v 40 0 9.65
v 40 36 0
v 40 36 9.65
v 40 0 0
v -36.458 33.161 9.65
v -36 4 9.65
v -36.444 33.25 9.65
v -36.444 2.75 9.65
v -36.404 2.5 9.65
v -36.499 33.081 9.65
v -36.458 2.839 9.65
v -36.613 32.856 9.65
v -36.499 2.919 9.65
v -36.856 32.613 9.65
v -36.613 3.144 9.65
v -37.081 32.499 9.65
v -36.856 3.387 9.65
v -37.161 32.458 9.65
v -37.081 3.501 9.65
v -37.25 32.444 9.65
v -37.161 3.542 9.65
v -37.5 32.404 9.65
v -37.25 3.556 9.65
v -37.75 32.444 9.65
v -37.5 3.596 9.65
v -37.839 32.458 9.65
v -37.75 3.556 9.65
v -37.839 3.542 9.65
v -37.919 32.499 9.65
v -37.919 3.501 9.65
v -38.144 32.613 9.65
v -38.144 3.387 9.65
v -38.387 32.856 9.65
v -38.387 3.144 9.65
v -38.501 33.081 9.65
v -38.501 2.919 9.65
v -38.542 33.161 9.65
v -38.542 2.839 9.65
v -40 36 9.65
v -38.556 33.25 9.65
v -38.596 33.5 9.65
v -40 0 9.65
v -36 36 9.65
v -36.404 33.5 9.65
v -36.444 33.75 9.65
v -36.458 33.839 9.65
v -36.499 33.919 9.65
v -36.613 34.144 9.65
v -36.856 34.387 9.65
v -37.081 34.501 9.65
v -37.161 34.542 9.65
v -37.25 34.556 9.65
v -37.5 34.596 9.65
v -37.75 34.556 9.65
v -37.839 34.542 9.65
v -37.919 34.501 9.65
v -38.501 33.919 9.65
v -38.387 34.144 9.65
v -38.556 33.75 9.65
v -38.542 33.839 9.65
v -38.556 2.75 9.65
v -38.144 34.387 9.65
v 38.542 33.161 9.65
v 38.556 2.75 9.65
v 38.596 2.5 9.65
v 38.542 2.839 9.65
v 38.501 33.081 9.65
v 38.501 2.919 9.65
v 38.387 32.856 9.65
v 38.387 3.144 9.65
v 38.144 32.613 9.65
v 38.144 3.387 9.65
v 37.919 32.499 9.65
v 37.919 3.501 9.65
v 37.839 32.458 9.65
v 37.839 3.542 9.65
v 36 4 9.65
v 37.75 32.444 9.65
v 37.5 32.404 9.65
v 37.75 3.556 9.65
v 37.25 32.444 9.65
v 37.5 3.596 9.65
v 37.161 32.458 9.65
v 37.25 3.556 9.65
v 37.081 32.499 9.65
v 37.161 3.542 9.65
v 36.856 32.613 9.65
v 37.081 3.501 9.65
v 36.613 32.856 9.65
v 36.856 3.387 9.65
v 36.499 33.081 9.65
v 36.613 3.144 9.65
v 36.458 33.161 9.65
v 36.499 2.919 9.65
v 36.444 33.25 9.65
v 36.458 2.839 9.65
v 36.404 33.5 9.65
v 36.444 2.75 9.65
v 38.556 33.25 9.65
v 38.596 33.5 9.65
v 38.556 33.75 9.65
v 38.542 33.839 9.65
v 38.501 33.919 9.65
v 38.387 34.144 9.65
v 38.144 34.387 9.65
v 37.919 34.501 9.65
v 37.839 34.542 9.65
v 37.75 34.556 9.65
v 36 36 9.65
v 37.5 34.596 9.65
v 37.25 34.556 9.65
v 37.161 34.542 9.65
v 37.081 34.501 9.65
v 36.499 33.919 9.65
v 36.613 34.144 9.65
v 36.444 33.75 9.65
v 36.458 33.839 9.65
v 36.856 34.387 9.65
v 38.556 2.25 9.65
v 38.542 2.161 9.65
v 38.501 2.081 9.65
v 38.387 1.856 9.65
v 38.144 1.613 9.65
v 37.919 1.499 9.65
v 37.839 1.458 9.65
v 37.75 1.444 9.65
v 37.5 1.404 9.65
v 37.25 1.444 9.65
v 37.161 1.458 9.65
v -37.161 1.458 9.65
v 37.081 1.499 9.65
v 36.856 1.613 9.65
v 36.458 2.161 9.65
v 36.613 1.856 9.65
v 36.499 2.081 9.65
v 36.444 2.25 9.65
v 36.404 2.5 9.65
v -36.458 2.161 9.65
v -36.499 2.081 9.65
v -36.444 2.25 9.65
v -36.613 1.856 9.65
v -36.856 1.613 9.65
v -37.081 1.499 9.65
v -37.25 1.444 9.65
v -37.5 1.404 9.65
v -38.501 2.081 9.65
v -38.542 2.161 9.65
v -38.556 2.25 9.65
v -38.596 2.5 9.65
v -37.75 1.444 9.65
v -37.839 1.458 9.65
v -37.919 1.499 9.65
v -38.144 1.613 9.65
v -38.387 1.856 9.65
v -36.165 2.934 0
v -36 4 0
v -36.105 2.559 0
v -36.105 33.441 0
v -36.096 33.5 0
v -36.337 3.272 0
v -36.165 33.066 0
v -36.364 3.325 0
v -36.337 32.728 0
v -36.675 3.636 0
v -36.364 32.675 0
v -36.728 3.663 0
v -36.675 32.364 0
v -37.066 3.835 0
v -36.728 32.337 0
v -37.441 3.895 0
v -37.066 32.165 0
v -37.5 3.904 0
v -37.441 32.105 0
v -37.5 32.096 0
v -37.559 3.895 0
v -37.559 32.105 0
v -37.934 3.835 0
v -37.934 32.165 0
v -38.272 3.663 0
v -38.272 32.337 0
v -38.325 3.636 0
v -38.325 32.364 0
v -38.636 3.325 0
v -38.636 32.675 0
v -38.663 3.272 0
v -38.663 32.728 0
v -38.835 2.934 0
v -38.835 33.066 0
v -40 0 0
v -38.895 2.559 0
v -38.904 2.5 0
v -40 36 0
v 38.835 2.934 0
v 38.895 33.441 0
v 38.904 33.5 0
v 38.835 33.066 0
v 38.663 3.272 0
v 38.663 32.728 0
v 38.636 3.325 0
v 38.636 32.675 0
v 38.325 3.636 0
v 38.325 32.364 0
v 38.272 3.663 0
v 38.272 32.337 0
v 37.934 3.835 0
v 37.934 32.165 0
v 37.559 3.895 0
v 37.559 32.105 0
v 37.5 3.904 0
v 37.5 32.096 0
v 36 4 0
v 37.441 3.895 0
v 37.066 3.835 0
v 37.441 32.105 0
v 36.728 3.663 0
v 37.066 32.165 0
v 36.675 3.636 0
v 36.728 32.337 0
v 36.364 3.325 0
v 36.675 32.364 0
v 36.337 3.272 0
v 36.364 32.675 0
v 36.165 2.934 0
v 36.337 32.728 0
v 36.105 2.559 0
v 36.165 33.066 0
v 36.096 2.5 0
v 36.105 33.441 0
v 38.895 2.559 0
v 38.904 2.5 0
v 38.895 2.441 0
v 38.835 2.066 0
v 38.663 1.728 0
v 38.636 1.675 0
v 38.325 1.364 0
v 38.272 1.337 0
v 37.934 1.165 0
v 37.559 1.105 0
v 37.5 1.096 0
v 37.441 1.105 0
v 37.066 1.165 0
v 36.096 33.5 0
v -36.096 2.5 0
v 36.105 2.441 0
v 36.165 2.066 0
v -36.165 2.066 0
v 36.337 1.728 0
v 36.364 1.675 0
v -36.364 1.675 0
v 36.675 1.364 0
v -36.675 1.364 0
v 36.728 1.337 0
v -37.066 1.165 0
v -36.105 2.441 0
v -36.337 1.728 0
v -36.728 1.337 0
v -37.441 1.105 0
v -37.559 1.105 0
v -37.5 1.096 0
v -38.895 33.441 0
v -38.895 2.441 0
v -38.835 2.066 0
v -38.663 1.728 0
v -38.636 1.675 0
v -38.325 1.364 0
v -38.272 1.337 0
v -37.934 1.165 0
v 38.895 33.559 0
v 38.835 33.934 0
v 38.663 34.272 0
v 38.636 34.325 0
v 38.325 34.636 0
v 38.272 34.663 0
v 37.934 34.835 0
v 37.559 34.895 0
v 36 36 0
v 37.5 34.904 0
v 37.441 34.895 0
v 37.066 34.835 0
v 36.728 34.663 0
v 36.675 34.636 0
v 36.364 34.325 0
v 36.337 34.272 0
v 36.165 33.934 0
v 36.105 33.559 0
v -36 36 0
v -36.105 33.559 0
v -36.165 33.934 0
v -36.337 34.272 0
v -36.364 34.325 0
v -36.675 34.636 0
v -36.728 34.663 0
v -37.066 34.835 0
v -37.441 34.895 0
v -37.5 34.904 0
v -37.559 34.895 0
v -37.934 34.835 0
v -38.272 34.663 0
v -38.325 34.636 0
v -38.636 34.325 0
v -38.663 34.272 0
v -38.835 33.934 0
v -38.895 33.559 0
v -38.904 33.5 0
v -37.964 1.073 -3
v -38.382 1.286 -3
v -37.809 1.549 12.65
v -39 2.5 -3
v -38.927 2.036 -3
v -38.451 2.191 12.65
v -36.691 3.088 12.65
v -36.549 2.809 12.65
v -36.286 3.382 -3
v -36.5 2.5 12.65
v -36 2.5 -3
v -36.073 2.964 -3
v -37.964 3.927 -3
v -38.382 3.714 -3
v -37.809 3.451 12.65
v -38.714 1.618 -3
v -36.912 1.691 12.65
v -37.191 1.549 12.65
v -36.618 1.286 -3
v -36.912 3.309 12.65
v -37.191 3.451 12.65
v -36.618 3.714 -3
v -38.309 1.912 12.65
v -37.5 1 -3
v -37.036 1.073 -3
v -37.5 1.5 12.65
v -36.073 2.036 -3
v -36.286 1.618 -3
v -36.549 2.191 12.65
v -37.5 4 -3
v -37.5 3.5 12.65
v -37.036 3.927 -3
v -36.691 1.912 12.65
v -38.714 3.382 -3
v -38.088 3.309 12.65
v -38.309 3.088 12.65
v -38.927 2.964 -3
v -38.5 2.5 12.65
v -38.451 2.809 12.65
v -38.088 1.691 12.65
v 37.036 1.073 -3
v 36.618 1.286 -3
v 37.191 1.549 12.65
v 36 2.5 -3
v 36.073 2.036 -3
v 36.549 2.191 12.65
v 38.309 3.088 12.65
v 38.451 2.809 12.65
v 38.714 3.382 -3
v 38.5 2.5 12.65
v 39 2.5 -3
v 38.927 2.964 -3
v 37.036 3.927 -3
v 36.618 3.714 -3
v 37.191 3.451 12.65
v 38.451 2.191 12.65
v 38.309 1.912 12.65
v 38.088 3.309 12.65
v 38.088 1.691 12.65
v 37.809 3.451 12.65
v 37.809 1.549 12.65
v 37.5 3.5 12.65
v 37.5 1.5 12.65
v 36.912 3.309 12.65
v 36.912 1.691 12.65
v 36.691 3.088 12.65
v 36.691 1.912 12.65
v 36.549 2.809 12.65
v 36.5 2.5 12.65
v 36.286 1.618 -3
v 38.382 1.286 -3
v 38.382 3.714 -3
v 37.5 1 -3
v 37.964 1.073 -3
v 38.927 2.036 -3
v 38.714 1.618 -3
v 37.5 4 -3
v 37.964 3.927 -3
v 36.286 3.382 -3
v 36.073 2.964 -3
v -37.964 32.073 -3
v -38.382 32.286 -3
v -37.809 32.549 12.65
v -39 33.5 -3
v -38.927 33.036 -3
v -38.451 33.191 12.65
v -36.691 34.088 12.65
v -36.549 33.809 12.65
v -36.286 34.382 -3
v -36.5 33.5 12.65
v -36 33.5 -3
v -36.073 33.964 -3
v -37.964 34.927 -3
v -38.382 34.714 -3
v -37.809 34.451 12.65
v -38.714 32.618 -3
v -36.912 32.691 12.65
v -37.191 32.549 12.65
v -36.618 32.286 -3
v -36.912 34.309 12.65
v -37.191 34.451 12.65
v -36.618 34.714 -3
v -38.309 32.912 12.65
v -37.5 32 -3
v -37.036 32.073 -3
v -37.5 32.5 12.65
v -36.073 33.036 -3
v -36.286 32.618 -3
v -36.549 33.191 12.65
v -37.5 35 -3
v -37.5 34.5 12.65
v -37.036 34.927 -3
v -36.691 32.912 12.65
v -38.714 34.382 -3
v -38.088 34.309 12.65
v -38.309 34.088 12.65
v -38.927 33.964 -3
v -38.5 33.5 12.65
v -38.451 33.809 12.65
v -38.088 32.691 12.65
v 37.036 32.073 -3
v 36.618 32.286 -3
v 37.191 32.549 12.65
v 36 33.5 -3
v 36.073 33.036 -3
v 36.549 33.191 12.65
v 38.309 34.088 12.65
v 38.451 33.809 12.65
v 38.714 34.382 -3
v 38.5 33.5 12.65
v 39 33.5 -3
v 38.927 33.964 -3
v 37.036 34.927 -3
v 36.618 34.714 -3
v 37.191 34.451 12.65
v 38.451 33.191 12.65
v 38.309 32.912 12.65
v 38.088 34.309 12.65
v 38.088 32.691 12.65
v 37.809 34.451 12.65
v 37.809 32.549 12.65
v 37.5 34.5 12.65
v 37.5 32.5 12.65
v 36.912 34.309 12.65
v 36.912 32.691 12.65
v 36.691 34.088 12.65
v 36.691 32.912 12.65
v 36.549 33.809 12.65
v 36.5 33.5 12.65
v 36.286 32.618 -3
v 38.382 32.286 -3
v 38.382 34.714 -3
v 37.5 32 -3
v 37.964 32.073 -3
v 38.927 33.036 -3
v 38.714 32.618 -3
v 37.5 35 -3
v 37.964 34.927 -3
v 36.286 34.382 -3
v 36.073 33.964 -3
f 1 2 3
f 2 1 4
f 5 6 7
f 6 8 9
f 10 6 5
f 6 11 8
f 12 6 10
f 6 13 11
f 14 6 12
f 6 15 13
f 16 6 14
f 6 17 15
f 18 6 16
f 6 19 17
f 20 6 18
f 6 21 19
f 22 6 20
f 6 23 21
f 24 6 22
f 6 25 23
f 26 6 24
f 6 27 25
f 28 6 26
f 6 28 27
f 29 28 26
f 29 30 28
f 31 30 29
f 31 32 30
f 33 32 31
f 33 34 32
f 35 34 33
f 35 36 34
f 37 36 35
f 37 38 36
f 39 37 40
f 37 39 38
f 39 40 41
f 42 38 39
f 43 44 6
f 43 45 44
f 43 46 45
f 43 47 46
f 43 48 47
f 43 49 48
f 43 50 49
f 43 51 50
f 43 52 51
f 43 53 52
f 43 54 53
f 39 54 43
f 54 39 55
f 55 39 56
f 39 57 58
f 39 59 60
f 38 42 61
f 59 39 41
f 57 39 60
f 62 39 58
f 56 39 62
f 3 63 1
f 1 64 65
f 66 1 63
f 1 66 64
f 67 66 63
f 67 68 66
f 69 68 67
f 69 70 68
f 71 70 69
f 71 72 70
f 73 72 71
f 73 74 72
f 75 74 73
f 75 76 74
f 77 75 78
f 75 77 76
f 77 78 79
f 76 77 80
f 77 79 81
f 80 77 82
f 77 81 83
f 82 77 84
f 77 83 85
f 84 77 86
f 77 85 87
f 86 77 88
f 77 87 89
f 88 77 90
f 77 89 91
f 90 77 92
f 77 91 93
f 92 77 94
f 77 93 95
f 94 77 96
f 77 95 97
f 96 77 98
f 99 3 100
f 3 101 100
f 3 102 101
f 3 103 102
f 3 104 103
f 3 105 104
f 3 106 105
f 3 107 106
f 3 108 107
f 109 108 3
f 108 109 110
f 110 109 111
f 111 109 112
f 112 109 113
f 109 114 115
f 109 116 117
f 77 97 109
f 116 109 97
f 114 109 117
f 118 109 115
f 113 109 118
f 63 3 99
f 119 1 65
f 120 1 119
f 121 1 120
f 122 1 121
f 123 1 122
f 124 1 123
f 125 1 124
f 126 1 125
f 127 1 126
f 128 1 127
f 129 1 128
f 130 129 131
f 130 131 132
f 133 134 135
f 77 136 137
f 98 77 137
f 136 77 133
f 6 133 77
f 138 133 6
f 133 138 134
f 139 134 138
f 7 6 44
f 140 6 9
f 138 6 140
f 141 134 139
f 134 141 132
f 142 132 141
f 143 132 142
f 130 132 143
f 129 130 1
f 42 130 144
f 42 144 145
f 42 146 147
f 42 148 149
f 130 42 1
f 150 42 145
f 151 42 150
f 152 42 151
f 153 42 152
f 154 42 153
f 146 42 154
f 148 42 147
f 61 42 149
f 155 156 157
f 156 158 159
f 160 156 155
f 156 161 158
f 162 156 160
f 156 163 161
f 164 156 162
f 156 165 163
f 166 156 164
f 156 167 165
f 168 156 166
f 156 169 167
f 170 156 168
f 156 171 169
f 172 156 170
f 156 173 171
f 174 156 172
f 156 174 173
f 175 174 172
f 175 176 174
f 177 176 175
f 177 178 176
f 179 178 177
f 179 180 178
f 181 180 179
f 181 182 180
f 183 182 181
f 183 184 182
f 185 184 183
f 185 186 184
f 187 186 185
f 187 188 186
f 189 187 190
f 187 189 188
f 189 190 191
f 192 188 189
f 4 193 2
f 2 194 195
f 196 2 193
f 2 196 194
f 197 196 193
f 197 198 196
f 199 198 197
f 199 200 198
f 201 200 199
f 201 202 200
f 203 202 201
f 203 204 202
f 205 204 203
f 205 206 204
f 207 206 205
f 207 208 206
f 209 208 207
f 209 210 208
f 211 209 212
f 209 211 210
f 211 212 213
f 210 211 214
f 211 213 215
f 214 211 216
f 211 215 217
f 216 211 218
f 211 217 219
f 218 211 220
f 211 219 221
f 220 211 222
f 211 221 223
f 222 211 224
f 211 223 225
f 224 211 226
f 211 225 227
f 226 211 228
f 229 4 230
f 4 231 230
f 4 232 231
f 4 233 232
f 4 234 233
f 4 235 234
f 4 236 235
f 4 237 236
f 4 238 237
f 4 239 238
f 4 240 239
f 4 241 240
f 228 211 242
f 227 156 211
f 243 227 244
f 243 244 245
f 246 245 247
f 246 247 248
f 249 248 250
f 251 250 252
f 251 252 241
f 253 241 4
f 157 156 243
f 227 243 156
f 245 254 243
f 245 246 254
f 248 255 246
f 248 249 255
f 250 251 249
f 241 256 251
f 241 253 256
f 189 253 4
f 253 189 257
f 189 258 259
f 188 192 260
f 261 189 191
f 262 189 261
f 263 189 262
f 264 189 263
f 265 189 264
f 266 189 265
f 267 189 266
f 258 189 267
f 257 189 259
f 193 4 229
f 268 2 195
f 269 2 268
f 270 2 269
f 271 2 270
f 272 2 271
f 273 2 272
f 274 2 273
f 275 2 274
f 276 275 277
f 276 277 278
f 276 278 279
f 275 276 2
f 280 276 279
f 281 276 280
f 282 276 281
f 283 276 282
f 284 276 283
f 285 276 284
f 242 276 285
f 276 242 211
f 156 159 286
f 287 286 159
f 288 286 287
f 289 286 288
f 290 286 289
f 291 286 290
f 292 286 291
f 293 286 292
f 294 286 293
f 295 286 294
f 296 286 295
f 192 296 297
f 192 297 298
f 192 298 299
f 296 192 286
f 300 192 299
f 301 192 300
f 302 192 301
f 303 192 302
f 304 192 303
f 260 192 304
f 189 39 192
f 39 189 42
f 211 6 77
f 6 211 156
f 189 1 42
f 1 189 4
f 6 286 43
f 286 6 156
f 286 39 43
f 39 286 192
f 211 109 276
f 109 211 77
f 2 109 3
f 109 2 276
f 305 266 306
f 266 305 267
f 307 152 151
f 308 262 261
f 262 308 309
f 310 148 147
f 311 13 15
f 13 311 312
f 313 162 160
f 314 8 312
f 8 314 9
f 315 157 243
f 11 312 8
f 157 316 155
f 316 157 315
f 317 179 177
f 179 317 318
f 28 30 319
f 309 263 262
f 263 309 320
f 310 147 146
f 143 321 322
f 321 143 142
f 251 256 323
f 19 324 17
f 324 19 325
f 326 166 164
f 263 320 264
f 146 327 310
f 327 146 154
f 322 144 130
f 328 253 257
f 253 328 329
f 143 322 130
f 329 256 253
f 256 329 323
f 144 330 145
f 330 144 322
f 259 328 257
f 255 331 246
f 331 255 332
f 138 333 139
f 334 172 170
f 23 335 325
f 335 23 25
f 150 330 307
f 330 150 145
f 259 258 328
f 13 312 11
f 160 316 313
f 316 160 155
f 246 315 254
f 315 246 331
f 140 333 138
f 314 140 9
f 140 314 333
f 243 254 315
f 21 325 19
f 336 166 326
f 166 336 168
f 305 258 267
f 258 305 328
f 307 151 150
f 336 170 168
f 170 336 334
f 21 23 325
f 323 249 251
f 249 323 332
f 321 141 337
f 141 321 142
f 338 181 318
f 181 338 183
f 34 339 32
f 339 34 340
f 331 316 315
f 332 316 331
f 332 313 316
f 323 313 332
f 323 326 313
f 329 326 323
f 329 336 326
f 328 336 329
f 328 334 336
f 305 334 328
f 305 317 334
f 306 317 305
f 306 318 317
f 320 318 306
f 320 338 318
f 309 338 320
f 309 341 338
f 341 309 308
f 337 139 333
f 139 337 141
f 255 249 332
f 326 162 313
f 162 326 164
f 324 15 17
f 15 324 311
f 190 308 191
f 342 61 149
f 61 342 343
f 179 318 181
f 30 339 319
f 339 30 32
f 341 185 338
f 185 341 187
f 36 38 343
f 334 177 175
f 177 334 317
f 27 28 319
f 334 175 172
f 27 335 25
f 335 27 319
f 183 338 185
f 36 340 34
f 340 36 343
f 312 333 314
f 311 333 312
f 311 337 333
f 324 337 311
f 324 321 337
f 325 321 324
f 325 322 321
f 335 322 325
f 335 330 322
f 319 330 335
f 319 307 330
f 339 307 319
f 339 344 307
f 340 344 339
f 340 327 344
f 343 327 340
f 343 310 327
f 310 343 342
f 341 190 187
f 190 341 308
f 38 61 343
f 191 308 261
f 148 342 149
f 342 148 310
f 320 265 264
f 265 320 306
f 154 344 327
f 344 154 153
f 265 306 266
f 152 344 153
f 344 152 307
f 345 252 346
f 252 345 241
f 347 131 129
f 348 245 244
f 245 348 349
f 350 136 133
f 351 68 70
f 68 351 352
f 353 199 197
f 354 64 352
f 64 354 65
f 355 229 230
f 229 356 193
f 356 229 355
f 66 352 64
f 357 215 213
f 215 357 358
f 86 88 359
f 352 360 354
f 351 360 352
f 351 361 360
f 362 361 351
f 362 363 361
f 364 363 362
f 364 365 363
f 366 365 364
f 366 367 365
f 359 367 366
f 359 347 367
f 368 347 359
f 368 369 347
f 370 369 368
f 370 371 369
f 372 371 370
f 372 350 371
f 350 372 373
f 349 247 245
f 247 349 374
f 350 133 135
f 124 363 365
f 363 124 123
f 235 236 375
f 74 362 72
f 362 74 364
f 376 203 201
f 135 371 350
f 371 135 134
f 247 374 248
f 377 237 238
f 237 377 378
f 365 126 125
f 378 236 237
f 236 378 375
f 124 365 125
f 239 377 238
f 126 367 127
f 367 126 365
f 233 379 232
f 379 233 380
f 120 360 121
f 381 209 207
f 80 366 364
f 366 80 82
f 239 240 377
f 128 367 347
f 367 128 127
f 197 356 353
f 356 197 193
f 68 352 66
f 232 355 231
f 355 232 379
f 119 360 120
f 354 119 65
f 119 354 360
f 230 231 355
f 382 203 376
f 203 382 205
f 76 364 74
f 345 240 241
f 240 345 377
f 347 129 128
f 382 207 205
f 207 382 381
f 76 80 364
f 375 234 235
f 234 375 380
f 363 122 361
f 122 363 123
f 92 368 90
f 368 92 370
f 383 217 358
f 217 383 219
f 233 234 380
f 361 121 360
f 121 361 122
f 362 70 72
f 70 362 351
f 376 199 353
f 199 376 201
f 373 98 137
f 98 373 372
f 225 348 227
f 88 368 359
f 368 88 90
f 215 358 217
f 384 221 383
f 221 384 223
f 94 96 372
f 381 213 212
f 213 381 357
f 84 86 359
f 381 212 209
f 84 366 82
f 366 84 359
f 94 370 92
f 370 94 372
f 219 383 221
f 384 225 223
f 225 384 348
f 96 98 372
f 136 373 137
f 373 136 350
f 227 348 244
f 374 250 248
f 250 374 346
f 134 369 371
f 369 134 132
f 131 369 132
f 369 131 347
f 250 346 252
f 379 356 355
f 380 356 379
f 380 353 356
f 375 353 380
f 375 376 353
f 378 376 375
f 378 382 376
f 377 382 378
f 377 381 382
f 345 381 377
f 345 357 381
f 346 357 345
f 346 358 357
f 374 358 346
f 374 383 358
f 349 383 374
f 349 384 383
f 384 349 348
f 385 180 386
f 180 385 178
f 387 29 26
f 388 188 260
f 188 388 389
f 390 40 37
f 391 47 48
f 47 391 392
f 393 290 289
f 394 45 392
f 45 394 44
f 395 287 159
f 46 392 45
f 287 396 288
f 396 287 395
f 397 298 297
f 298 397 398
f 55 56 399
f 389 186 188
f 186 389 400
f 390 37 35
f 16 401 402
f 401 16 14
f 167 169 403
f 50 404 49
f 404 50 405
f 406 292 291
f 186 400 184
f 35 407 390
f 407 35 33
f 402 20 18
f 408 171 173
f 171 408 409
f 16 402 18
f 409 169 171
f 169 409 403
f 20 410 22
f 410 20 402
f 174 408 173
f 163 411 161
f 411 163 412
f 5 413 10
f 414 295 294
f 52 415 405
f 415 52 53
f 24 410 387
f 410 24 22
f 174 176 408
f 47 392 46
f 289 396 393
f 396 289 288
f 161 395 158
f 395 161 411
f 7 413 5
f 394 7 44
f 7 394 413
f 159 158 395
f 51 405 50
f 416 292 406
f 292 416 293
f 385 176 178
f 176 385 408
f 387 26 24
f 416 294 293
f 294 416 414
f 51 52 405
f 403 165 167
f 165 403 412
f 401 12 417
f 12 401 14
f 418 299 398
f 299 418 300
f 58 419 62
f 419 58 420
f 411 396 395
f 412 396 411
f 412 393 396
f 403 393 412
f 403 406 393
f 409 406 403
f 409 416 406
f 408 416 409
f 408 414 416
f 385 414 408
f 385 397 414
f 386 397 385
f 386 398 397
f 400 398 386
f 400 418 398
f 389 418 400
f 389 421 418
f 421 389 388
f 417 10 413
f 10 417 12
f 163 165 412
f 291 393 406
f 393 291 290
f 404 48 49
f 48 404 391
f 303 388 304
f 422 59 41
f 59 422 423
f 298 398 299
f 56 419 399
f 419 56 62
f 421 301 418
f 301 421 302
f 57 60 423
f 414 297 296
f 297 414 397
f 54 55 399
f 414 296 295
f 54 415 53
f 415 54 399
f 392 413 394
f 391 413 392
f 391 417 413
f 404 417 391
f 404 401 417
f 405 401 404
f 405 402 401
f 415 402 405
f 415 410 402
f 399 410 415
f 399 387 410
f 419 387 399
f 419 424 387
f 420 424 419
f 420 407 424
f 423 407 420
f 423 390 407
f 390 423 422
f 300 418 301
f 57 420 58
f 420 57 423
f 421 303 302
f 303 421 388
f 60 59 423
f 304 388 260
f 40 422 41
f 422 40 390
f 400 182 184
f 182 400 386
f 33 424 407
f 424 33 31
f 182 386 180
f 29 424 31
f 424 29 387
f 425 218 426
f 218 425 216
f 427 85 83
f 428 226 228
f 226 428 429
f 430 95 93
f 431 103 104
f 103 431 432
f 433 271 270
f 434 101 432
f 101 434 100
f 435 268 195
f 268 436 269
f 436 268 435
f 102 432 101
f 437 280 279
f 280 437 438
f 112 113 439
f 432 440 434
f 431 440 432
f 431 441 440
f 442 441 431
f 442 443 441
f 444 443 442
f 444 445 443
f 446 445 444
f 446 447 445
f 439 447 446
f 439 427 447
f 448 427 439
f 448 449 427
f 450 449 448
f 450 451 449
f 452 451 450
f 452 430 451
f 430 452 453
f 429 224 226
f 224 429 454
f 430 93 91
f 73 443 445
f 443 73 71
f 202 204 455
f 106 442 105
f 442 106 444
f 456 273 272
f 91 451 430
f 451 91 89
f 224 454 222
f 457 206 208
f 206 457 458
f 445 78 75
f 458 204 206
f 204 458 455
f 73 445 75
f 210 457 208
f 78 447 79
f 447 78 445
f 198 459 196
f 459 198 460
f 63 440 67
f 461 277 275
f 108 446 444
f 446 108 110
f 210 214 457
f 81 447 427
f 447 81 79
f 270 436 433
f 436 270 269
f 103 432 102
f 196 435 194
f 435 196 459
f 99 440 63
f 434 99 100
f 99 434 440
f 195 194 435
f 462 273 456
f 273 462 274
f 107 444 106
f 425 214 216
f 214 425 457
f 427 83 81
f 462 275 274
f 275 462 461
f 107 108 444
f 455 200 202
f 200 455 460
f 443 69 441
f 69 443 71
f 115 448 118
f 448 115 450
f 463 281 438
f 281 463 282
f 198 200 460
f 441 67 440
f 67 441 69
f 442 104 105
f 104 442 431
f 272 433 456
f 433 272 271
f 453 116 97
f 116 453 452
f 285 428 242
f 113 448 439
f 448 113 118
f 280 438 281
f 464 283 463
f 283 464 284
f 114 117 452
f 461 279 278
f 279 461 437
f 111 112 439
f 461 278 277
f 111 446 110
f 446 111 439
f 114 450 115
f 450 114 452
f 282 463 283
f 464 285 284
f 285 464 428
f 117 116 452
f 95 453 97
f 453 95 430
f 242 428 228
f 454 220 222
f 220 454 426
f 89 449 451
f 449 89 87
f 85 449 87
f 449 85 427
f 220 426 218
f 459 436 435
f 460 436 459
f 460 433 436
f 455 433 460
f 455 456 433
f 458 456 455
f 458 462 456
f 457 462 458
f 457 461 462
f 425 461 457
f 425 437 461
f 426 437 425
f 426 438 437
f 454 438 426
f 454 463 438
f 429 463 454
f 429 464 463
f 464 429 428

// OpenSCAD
$fn = 20;
eps = 1e-3;

// TODO: Proper dimensions.
size_x = 80;
size_y = 36;
size_z = 9.65;
width = 4;

pin_length = 3;
pin_radius = 1.5;
pin_offset_left = 2.5;
pin_offset_right = pin_offset_left;
pin_offset_top = 2.5;
pin_offset_bottom = pin_offset_top;

translate([-size_x/2, 0, 0]) {
  cube([size_x, width, size_z]);
  cube([width, size_y, size_z]);
  translate([size_x - width, 0, 0]) {
    cube([width, size_y, size_z]);
  };
  translate([pin_offset_left, pin_offset_bottom, -pin_length]) {
    cylinder(2*pin_length + size_z, pin_radius);
  }
  translate([size_x - pin_offset_right, pin_offset_bottom, -pin_length]) {
    cylinder(2*pin_length + size_z, pin_radius);
  }
  translate([pin_offset_left, size_y - pin_offset_top, -pin_length]) {
    cylinder(2*pin_length + size_z, pin_radius);
  }
  translate([size_x - pin_offset_right, size_y - pin_offset_top, -pin_length]) {
    cylinder(2*pin_length + size_z, pin_radius);
  }
}
